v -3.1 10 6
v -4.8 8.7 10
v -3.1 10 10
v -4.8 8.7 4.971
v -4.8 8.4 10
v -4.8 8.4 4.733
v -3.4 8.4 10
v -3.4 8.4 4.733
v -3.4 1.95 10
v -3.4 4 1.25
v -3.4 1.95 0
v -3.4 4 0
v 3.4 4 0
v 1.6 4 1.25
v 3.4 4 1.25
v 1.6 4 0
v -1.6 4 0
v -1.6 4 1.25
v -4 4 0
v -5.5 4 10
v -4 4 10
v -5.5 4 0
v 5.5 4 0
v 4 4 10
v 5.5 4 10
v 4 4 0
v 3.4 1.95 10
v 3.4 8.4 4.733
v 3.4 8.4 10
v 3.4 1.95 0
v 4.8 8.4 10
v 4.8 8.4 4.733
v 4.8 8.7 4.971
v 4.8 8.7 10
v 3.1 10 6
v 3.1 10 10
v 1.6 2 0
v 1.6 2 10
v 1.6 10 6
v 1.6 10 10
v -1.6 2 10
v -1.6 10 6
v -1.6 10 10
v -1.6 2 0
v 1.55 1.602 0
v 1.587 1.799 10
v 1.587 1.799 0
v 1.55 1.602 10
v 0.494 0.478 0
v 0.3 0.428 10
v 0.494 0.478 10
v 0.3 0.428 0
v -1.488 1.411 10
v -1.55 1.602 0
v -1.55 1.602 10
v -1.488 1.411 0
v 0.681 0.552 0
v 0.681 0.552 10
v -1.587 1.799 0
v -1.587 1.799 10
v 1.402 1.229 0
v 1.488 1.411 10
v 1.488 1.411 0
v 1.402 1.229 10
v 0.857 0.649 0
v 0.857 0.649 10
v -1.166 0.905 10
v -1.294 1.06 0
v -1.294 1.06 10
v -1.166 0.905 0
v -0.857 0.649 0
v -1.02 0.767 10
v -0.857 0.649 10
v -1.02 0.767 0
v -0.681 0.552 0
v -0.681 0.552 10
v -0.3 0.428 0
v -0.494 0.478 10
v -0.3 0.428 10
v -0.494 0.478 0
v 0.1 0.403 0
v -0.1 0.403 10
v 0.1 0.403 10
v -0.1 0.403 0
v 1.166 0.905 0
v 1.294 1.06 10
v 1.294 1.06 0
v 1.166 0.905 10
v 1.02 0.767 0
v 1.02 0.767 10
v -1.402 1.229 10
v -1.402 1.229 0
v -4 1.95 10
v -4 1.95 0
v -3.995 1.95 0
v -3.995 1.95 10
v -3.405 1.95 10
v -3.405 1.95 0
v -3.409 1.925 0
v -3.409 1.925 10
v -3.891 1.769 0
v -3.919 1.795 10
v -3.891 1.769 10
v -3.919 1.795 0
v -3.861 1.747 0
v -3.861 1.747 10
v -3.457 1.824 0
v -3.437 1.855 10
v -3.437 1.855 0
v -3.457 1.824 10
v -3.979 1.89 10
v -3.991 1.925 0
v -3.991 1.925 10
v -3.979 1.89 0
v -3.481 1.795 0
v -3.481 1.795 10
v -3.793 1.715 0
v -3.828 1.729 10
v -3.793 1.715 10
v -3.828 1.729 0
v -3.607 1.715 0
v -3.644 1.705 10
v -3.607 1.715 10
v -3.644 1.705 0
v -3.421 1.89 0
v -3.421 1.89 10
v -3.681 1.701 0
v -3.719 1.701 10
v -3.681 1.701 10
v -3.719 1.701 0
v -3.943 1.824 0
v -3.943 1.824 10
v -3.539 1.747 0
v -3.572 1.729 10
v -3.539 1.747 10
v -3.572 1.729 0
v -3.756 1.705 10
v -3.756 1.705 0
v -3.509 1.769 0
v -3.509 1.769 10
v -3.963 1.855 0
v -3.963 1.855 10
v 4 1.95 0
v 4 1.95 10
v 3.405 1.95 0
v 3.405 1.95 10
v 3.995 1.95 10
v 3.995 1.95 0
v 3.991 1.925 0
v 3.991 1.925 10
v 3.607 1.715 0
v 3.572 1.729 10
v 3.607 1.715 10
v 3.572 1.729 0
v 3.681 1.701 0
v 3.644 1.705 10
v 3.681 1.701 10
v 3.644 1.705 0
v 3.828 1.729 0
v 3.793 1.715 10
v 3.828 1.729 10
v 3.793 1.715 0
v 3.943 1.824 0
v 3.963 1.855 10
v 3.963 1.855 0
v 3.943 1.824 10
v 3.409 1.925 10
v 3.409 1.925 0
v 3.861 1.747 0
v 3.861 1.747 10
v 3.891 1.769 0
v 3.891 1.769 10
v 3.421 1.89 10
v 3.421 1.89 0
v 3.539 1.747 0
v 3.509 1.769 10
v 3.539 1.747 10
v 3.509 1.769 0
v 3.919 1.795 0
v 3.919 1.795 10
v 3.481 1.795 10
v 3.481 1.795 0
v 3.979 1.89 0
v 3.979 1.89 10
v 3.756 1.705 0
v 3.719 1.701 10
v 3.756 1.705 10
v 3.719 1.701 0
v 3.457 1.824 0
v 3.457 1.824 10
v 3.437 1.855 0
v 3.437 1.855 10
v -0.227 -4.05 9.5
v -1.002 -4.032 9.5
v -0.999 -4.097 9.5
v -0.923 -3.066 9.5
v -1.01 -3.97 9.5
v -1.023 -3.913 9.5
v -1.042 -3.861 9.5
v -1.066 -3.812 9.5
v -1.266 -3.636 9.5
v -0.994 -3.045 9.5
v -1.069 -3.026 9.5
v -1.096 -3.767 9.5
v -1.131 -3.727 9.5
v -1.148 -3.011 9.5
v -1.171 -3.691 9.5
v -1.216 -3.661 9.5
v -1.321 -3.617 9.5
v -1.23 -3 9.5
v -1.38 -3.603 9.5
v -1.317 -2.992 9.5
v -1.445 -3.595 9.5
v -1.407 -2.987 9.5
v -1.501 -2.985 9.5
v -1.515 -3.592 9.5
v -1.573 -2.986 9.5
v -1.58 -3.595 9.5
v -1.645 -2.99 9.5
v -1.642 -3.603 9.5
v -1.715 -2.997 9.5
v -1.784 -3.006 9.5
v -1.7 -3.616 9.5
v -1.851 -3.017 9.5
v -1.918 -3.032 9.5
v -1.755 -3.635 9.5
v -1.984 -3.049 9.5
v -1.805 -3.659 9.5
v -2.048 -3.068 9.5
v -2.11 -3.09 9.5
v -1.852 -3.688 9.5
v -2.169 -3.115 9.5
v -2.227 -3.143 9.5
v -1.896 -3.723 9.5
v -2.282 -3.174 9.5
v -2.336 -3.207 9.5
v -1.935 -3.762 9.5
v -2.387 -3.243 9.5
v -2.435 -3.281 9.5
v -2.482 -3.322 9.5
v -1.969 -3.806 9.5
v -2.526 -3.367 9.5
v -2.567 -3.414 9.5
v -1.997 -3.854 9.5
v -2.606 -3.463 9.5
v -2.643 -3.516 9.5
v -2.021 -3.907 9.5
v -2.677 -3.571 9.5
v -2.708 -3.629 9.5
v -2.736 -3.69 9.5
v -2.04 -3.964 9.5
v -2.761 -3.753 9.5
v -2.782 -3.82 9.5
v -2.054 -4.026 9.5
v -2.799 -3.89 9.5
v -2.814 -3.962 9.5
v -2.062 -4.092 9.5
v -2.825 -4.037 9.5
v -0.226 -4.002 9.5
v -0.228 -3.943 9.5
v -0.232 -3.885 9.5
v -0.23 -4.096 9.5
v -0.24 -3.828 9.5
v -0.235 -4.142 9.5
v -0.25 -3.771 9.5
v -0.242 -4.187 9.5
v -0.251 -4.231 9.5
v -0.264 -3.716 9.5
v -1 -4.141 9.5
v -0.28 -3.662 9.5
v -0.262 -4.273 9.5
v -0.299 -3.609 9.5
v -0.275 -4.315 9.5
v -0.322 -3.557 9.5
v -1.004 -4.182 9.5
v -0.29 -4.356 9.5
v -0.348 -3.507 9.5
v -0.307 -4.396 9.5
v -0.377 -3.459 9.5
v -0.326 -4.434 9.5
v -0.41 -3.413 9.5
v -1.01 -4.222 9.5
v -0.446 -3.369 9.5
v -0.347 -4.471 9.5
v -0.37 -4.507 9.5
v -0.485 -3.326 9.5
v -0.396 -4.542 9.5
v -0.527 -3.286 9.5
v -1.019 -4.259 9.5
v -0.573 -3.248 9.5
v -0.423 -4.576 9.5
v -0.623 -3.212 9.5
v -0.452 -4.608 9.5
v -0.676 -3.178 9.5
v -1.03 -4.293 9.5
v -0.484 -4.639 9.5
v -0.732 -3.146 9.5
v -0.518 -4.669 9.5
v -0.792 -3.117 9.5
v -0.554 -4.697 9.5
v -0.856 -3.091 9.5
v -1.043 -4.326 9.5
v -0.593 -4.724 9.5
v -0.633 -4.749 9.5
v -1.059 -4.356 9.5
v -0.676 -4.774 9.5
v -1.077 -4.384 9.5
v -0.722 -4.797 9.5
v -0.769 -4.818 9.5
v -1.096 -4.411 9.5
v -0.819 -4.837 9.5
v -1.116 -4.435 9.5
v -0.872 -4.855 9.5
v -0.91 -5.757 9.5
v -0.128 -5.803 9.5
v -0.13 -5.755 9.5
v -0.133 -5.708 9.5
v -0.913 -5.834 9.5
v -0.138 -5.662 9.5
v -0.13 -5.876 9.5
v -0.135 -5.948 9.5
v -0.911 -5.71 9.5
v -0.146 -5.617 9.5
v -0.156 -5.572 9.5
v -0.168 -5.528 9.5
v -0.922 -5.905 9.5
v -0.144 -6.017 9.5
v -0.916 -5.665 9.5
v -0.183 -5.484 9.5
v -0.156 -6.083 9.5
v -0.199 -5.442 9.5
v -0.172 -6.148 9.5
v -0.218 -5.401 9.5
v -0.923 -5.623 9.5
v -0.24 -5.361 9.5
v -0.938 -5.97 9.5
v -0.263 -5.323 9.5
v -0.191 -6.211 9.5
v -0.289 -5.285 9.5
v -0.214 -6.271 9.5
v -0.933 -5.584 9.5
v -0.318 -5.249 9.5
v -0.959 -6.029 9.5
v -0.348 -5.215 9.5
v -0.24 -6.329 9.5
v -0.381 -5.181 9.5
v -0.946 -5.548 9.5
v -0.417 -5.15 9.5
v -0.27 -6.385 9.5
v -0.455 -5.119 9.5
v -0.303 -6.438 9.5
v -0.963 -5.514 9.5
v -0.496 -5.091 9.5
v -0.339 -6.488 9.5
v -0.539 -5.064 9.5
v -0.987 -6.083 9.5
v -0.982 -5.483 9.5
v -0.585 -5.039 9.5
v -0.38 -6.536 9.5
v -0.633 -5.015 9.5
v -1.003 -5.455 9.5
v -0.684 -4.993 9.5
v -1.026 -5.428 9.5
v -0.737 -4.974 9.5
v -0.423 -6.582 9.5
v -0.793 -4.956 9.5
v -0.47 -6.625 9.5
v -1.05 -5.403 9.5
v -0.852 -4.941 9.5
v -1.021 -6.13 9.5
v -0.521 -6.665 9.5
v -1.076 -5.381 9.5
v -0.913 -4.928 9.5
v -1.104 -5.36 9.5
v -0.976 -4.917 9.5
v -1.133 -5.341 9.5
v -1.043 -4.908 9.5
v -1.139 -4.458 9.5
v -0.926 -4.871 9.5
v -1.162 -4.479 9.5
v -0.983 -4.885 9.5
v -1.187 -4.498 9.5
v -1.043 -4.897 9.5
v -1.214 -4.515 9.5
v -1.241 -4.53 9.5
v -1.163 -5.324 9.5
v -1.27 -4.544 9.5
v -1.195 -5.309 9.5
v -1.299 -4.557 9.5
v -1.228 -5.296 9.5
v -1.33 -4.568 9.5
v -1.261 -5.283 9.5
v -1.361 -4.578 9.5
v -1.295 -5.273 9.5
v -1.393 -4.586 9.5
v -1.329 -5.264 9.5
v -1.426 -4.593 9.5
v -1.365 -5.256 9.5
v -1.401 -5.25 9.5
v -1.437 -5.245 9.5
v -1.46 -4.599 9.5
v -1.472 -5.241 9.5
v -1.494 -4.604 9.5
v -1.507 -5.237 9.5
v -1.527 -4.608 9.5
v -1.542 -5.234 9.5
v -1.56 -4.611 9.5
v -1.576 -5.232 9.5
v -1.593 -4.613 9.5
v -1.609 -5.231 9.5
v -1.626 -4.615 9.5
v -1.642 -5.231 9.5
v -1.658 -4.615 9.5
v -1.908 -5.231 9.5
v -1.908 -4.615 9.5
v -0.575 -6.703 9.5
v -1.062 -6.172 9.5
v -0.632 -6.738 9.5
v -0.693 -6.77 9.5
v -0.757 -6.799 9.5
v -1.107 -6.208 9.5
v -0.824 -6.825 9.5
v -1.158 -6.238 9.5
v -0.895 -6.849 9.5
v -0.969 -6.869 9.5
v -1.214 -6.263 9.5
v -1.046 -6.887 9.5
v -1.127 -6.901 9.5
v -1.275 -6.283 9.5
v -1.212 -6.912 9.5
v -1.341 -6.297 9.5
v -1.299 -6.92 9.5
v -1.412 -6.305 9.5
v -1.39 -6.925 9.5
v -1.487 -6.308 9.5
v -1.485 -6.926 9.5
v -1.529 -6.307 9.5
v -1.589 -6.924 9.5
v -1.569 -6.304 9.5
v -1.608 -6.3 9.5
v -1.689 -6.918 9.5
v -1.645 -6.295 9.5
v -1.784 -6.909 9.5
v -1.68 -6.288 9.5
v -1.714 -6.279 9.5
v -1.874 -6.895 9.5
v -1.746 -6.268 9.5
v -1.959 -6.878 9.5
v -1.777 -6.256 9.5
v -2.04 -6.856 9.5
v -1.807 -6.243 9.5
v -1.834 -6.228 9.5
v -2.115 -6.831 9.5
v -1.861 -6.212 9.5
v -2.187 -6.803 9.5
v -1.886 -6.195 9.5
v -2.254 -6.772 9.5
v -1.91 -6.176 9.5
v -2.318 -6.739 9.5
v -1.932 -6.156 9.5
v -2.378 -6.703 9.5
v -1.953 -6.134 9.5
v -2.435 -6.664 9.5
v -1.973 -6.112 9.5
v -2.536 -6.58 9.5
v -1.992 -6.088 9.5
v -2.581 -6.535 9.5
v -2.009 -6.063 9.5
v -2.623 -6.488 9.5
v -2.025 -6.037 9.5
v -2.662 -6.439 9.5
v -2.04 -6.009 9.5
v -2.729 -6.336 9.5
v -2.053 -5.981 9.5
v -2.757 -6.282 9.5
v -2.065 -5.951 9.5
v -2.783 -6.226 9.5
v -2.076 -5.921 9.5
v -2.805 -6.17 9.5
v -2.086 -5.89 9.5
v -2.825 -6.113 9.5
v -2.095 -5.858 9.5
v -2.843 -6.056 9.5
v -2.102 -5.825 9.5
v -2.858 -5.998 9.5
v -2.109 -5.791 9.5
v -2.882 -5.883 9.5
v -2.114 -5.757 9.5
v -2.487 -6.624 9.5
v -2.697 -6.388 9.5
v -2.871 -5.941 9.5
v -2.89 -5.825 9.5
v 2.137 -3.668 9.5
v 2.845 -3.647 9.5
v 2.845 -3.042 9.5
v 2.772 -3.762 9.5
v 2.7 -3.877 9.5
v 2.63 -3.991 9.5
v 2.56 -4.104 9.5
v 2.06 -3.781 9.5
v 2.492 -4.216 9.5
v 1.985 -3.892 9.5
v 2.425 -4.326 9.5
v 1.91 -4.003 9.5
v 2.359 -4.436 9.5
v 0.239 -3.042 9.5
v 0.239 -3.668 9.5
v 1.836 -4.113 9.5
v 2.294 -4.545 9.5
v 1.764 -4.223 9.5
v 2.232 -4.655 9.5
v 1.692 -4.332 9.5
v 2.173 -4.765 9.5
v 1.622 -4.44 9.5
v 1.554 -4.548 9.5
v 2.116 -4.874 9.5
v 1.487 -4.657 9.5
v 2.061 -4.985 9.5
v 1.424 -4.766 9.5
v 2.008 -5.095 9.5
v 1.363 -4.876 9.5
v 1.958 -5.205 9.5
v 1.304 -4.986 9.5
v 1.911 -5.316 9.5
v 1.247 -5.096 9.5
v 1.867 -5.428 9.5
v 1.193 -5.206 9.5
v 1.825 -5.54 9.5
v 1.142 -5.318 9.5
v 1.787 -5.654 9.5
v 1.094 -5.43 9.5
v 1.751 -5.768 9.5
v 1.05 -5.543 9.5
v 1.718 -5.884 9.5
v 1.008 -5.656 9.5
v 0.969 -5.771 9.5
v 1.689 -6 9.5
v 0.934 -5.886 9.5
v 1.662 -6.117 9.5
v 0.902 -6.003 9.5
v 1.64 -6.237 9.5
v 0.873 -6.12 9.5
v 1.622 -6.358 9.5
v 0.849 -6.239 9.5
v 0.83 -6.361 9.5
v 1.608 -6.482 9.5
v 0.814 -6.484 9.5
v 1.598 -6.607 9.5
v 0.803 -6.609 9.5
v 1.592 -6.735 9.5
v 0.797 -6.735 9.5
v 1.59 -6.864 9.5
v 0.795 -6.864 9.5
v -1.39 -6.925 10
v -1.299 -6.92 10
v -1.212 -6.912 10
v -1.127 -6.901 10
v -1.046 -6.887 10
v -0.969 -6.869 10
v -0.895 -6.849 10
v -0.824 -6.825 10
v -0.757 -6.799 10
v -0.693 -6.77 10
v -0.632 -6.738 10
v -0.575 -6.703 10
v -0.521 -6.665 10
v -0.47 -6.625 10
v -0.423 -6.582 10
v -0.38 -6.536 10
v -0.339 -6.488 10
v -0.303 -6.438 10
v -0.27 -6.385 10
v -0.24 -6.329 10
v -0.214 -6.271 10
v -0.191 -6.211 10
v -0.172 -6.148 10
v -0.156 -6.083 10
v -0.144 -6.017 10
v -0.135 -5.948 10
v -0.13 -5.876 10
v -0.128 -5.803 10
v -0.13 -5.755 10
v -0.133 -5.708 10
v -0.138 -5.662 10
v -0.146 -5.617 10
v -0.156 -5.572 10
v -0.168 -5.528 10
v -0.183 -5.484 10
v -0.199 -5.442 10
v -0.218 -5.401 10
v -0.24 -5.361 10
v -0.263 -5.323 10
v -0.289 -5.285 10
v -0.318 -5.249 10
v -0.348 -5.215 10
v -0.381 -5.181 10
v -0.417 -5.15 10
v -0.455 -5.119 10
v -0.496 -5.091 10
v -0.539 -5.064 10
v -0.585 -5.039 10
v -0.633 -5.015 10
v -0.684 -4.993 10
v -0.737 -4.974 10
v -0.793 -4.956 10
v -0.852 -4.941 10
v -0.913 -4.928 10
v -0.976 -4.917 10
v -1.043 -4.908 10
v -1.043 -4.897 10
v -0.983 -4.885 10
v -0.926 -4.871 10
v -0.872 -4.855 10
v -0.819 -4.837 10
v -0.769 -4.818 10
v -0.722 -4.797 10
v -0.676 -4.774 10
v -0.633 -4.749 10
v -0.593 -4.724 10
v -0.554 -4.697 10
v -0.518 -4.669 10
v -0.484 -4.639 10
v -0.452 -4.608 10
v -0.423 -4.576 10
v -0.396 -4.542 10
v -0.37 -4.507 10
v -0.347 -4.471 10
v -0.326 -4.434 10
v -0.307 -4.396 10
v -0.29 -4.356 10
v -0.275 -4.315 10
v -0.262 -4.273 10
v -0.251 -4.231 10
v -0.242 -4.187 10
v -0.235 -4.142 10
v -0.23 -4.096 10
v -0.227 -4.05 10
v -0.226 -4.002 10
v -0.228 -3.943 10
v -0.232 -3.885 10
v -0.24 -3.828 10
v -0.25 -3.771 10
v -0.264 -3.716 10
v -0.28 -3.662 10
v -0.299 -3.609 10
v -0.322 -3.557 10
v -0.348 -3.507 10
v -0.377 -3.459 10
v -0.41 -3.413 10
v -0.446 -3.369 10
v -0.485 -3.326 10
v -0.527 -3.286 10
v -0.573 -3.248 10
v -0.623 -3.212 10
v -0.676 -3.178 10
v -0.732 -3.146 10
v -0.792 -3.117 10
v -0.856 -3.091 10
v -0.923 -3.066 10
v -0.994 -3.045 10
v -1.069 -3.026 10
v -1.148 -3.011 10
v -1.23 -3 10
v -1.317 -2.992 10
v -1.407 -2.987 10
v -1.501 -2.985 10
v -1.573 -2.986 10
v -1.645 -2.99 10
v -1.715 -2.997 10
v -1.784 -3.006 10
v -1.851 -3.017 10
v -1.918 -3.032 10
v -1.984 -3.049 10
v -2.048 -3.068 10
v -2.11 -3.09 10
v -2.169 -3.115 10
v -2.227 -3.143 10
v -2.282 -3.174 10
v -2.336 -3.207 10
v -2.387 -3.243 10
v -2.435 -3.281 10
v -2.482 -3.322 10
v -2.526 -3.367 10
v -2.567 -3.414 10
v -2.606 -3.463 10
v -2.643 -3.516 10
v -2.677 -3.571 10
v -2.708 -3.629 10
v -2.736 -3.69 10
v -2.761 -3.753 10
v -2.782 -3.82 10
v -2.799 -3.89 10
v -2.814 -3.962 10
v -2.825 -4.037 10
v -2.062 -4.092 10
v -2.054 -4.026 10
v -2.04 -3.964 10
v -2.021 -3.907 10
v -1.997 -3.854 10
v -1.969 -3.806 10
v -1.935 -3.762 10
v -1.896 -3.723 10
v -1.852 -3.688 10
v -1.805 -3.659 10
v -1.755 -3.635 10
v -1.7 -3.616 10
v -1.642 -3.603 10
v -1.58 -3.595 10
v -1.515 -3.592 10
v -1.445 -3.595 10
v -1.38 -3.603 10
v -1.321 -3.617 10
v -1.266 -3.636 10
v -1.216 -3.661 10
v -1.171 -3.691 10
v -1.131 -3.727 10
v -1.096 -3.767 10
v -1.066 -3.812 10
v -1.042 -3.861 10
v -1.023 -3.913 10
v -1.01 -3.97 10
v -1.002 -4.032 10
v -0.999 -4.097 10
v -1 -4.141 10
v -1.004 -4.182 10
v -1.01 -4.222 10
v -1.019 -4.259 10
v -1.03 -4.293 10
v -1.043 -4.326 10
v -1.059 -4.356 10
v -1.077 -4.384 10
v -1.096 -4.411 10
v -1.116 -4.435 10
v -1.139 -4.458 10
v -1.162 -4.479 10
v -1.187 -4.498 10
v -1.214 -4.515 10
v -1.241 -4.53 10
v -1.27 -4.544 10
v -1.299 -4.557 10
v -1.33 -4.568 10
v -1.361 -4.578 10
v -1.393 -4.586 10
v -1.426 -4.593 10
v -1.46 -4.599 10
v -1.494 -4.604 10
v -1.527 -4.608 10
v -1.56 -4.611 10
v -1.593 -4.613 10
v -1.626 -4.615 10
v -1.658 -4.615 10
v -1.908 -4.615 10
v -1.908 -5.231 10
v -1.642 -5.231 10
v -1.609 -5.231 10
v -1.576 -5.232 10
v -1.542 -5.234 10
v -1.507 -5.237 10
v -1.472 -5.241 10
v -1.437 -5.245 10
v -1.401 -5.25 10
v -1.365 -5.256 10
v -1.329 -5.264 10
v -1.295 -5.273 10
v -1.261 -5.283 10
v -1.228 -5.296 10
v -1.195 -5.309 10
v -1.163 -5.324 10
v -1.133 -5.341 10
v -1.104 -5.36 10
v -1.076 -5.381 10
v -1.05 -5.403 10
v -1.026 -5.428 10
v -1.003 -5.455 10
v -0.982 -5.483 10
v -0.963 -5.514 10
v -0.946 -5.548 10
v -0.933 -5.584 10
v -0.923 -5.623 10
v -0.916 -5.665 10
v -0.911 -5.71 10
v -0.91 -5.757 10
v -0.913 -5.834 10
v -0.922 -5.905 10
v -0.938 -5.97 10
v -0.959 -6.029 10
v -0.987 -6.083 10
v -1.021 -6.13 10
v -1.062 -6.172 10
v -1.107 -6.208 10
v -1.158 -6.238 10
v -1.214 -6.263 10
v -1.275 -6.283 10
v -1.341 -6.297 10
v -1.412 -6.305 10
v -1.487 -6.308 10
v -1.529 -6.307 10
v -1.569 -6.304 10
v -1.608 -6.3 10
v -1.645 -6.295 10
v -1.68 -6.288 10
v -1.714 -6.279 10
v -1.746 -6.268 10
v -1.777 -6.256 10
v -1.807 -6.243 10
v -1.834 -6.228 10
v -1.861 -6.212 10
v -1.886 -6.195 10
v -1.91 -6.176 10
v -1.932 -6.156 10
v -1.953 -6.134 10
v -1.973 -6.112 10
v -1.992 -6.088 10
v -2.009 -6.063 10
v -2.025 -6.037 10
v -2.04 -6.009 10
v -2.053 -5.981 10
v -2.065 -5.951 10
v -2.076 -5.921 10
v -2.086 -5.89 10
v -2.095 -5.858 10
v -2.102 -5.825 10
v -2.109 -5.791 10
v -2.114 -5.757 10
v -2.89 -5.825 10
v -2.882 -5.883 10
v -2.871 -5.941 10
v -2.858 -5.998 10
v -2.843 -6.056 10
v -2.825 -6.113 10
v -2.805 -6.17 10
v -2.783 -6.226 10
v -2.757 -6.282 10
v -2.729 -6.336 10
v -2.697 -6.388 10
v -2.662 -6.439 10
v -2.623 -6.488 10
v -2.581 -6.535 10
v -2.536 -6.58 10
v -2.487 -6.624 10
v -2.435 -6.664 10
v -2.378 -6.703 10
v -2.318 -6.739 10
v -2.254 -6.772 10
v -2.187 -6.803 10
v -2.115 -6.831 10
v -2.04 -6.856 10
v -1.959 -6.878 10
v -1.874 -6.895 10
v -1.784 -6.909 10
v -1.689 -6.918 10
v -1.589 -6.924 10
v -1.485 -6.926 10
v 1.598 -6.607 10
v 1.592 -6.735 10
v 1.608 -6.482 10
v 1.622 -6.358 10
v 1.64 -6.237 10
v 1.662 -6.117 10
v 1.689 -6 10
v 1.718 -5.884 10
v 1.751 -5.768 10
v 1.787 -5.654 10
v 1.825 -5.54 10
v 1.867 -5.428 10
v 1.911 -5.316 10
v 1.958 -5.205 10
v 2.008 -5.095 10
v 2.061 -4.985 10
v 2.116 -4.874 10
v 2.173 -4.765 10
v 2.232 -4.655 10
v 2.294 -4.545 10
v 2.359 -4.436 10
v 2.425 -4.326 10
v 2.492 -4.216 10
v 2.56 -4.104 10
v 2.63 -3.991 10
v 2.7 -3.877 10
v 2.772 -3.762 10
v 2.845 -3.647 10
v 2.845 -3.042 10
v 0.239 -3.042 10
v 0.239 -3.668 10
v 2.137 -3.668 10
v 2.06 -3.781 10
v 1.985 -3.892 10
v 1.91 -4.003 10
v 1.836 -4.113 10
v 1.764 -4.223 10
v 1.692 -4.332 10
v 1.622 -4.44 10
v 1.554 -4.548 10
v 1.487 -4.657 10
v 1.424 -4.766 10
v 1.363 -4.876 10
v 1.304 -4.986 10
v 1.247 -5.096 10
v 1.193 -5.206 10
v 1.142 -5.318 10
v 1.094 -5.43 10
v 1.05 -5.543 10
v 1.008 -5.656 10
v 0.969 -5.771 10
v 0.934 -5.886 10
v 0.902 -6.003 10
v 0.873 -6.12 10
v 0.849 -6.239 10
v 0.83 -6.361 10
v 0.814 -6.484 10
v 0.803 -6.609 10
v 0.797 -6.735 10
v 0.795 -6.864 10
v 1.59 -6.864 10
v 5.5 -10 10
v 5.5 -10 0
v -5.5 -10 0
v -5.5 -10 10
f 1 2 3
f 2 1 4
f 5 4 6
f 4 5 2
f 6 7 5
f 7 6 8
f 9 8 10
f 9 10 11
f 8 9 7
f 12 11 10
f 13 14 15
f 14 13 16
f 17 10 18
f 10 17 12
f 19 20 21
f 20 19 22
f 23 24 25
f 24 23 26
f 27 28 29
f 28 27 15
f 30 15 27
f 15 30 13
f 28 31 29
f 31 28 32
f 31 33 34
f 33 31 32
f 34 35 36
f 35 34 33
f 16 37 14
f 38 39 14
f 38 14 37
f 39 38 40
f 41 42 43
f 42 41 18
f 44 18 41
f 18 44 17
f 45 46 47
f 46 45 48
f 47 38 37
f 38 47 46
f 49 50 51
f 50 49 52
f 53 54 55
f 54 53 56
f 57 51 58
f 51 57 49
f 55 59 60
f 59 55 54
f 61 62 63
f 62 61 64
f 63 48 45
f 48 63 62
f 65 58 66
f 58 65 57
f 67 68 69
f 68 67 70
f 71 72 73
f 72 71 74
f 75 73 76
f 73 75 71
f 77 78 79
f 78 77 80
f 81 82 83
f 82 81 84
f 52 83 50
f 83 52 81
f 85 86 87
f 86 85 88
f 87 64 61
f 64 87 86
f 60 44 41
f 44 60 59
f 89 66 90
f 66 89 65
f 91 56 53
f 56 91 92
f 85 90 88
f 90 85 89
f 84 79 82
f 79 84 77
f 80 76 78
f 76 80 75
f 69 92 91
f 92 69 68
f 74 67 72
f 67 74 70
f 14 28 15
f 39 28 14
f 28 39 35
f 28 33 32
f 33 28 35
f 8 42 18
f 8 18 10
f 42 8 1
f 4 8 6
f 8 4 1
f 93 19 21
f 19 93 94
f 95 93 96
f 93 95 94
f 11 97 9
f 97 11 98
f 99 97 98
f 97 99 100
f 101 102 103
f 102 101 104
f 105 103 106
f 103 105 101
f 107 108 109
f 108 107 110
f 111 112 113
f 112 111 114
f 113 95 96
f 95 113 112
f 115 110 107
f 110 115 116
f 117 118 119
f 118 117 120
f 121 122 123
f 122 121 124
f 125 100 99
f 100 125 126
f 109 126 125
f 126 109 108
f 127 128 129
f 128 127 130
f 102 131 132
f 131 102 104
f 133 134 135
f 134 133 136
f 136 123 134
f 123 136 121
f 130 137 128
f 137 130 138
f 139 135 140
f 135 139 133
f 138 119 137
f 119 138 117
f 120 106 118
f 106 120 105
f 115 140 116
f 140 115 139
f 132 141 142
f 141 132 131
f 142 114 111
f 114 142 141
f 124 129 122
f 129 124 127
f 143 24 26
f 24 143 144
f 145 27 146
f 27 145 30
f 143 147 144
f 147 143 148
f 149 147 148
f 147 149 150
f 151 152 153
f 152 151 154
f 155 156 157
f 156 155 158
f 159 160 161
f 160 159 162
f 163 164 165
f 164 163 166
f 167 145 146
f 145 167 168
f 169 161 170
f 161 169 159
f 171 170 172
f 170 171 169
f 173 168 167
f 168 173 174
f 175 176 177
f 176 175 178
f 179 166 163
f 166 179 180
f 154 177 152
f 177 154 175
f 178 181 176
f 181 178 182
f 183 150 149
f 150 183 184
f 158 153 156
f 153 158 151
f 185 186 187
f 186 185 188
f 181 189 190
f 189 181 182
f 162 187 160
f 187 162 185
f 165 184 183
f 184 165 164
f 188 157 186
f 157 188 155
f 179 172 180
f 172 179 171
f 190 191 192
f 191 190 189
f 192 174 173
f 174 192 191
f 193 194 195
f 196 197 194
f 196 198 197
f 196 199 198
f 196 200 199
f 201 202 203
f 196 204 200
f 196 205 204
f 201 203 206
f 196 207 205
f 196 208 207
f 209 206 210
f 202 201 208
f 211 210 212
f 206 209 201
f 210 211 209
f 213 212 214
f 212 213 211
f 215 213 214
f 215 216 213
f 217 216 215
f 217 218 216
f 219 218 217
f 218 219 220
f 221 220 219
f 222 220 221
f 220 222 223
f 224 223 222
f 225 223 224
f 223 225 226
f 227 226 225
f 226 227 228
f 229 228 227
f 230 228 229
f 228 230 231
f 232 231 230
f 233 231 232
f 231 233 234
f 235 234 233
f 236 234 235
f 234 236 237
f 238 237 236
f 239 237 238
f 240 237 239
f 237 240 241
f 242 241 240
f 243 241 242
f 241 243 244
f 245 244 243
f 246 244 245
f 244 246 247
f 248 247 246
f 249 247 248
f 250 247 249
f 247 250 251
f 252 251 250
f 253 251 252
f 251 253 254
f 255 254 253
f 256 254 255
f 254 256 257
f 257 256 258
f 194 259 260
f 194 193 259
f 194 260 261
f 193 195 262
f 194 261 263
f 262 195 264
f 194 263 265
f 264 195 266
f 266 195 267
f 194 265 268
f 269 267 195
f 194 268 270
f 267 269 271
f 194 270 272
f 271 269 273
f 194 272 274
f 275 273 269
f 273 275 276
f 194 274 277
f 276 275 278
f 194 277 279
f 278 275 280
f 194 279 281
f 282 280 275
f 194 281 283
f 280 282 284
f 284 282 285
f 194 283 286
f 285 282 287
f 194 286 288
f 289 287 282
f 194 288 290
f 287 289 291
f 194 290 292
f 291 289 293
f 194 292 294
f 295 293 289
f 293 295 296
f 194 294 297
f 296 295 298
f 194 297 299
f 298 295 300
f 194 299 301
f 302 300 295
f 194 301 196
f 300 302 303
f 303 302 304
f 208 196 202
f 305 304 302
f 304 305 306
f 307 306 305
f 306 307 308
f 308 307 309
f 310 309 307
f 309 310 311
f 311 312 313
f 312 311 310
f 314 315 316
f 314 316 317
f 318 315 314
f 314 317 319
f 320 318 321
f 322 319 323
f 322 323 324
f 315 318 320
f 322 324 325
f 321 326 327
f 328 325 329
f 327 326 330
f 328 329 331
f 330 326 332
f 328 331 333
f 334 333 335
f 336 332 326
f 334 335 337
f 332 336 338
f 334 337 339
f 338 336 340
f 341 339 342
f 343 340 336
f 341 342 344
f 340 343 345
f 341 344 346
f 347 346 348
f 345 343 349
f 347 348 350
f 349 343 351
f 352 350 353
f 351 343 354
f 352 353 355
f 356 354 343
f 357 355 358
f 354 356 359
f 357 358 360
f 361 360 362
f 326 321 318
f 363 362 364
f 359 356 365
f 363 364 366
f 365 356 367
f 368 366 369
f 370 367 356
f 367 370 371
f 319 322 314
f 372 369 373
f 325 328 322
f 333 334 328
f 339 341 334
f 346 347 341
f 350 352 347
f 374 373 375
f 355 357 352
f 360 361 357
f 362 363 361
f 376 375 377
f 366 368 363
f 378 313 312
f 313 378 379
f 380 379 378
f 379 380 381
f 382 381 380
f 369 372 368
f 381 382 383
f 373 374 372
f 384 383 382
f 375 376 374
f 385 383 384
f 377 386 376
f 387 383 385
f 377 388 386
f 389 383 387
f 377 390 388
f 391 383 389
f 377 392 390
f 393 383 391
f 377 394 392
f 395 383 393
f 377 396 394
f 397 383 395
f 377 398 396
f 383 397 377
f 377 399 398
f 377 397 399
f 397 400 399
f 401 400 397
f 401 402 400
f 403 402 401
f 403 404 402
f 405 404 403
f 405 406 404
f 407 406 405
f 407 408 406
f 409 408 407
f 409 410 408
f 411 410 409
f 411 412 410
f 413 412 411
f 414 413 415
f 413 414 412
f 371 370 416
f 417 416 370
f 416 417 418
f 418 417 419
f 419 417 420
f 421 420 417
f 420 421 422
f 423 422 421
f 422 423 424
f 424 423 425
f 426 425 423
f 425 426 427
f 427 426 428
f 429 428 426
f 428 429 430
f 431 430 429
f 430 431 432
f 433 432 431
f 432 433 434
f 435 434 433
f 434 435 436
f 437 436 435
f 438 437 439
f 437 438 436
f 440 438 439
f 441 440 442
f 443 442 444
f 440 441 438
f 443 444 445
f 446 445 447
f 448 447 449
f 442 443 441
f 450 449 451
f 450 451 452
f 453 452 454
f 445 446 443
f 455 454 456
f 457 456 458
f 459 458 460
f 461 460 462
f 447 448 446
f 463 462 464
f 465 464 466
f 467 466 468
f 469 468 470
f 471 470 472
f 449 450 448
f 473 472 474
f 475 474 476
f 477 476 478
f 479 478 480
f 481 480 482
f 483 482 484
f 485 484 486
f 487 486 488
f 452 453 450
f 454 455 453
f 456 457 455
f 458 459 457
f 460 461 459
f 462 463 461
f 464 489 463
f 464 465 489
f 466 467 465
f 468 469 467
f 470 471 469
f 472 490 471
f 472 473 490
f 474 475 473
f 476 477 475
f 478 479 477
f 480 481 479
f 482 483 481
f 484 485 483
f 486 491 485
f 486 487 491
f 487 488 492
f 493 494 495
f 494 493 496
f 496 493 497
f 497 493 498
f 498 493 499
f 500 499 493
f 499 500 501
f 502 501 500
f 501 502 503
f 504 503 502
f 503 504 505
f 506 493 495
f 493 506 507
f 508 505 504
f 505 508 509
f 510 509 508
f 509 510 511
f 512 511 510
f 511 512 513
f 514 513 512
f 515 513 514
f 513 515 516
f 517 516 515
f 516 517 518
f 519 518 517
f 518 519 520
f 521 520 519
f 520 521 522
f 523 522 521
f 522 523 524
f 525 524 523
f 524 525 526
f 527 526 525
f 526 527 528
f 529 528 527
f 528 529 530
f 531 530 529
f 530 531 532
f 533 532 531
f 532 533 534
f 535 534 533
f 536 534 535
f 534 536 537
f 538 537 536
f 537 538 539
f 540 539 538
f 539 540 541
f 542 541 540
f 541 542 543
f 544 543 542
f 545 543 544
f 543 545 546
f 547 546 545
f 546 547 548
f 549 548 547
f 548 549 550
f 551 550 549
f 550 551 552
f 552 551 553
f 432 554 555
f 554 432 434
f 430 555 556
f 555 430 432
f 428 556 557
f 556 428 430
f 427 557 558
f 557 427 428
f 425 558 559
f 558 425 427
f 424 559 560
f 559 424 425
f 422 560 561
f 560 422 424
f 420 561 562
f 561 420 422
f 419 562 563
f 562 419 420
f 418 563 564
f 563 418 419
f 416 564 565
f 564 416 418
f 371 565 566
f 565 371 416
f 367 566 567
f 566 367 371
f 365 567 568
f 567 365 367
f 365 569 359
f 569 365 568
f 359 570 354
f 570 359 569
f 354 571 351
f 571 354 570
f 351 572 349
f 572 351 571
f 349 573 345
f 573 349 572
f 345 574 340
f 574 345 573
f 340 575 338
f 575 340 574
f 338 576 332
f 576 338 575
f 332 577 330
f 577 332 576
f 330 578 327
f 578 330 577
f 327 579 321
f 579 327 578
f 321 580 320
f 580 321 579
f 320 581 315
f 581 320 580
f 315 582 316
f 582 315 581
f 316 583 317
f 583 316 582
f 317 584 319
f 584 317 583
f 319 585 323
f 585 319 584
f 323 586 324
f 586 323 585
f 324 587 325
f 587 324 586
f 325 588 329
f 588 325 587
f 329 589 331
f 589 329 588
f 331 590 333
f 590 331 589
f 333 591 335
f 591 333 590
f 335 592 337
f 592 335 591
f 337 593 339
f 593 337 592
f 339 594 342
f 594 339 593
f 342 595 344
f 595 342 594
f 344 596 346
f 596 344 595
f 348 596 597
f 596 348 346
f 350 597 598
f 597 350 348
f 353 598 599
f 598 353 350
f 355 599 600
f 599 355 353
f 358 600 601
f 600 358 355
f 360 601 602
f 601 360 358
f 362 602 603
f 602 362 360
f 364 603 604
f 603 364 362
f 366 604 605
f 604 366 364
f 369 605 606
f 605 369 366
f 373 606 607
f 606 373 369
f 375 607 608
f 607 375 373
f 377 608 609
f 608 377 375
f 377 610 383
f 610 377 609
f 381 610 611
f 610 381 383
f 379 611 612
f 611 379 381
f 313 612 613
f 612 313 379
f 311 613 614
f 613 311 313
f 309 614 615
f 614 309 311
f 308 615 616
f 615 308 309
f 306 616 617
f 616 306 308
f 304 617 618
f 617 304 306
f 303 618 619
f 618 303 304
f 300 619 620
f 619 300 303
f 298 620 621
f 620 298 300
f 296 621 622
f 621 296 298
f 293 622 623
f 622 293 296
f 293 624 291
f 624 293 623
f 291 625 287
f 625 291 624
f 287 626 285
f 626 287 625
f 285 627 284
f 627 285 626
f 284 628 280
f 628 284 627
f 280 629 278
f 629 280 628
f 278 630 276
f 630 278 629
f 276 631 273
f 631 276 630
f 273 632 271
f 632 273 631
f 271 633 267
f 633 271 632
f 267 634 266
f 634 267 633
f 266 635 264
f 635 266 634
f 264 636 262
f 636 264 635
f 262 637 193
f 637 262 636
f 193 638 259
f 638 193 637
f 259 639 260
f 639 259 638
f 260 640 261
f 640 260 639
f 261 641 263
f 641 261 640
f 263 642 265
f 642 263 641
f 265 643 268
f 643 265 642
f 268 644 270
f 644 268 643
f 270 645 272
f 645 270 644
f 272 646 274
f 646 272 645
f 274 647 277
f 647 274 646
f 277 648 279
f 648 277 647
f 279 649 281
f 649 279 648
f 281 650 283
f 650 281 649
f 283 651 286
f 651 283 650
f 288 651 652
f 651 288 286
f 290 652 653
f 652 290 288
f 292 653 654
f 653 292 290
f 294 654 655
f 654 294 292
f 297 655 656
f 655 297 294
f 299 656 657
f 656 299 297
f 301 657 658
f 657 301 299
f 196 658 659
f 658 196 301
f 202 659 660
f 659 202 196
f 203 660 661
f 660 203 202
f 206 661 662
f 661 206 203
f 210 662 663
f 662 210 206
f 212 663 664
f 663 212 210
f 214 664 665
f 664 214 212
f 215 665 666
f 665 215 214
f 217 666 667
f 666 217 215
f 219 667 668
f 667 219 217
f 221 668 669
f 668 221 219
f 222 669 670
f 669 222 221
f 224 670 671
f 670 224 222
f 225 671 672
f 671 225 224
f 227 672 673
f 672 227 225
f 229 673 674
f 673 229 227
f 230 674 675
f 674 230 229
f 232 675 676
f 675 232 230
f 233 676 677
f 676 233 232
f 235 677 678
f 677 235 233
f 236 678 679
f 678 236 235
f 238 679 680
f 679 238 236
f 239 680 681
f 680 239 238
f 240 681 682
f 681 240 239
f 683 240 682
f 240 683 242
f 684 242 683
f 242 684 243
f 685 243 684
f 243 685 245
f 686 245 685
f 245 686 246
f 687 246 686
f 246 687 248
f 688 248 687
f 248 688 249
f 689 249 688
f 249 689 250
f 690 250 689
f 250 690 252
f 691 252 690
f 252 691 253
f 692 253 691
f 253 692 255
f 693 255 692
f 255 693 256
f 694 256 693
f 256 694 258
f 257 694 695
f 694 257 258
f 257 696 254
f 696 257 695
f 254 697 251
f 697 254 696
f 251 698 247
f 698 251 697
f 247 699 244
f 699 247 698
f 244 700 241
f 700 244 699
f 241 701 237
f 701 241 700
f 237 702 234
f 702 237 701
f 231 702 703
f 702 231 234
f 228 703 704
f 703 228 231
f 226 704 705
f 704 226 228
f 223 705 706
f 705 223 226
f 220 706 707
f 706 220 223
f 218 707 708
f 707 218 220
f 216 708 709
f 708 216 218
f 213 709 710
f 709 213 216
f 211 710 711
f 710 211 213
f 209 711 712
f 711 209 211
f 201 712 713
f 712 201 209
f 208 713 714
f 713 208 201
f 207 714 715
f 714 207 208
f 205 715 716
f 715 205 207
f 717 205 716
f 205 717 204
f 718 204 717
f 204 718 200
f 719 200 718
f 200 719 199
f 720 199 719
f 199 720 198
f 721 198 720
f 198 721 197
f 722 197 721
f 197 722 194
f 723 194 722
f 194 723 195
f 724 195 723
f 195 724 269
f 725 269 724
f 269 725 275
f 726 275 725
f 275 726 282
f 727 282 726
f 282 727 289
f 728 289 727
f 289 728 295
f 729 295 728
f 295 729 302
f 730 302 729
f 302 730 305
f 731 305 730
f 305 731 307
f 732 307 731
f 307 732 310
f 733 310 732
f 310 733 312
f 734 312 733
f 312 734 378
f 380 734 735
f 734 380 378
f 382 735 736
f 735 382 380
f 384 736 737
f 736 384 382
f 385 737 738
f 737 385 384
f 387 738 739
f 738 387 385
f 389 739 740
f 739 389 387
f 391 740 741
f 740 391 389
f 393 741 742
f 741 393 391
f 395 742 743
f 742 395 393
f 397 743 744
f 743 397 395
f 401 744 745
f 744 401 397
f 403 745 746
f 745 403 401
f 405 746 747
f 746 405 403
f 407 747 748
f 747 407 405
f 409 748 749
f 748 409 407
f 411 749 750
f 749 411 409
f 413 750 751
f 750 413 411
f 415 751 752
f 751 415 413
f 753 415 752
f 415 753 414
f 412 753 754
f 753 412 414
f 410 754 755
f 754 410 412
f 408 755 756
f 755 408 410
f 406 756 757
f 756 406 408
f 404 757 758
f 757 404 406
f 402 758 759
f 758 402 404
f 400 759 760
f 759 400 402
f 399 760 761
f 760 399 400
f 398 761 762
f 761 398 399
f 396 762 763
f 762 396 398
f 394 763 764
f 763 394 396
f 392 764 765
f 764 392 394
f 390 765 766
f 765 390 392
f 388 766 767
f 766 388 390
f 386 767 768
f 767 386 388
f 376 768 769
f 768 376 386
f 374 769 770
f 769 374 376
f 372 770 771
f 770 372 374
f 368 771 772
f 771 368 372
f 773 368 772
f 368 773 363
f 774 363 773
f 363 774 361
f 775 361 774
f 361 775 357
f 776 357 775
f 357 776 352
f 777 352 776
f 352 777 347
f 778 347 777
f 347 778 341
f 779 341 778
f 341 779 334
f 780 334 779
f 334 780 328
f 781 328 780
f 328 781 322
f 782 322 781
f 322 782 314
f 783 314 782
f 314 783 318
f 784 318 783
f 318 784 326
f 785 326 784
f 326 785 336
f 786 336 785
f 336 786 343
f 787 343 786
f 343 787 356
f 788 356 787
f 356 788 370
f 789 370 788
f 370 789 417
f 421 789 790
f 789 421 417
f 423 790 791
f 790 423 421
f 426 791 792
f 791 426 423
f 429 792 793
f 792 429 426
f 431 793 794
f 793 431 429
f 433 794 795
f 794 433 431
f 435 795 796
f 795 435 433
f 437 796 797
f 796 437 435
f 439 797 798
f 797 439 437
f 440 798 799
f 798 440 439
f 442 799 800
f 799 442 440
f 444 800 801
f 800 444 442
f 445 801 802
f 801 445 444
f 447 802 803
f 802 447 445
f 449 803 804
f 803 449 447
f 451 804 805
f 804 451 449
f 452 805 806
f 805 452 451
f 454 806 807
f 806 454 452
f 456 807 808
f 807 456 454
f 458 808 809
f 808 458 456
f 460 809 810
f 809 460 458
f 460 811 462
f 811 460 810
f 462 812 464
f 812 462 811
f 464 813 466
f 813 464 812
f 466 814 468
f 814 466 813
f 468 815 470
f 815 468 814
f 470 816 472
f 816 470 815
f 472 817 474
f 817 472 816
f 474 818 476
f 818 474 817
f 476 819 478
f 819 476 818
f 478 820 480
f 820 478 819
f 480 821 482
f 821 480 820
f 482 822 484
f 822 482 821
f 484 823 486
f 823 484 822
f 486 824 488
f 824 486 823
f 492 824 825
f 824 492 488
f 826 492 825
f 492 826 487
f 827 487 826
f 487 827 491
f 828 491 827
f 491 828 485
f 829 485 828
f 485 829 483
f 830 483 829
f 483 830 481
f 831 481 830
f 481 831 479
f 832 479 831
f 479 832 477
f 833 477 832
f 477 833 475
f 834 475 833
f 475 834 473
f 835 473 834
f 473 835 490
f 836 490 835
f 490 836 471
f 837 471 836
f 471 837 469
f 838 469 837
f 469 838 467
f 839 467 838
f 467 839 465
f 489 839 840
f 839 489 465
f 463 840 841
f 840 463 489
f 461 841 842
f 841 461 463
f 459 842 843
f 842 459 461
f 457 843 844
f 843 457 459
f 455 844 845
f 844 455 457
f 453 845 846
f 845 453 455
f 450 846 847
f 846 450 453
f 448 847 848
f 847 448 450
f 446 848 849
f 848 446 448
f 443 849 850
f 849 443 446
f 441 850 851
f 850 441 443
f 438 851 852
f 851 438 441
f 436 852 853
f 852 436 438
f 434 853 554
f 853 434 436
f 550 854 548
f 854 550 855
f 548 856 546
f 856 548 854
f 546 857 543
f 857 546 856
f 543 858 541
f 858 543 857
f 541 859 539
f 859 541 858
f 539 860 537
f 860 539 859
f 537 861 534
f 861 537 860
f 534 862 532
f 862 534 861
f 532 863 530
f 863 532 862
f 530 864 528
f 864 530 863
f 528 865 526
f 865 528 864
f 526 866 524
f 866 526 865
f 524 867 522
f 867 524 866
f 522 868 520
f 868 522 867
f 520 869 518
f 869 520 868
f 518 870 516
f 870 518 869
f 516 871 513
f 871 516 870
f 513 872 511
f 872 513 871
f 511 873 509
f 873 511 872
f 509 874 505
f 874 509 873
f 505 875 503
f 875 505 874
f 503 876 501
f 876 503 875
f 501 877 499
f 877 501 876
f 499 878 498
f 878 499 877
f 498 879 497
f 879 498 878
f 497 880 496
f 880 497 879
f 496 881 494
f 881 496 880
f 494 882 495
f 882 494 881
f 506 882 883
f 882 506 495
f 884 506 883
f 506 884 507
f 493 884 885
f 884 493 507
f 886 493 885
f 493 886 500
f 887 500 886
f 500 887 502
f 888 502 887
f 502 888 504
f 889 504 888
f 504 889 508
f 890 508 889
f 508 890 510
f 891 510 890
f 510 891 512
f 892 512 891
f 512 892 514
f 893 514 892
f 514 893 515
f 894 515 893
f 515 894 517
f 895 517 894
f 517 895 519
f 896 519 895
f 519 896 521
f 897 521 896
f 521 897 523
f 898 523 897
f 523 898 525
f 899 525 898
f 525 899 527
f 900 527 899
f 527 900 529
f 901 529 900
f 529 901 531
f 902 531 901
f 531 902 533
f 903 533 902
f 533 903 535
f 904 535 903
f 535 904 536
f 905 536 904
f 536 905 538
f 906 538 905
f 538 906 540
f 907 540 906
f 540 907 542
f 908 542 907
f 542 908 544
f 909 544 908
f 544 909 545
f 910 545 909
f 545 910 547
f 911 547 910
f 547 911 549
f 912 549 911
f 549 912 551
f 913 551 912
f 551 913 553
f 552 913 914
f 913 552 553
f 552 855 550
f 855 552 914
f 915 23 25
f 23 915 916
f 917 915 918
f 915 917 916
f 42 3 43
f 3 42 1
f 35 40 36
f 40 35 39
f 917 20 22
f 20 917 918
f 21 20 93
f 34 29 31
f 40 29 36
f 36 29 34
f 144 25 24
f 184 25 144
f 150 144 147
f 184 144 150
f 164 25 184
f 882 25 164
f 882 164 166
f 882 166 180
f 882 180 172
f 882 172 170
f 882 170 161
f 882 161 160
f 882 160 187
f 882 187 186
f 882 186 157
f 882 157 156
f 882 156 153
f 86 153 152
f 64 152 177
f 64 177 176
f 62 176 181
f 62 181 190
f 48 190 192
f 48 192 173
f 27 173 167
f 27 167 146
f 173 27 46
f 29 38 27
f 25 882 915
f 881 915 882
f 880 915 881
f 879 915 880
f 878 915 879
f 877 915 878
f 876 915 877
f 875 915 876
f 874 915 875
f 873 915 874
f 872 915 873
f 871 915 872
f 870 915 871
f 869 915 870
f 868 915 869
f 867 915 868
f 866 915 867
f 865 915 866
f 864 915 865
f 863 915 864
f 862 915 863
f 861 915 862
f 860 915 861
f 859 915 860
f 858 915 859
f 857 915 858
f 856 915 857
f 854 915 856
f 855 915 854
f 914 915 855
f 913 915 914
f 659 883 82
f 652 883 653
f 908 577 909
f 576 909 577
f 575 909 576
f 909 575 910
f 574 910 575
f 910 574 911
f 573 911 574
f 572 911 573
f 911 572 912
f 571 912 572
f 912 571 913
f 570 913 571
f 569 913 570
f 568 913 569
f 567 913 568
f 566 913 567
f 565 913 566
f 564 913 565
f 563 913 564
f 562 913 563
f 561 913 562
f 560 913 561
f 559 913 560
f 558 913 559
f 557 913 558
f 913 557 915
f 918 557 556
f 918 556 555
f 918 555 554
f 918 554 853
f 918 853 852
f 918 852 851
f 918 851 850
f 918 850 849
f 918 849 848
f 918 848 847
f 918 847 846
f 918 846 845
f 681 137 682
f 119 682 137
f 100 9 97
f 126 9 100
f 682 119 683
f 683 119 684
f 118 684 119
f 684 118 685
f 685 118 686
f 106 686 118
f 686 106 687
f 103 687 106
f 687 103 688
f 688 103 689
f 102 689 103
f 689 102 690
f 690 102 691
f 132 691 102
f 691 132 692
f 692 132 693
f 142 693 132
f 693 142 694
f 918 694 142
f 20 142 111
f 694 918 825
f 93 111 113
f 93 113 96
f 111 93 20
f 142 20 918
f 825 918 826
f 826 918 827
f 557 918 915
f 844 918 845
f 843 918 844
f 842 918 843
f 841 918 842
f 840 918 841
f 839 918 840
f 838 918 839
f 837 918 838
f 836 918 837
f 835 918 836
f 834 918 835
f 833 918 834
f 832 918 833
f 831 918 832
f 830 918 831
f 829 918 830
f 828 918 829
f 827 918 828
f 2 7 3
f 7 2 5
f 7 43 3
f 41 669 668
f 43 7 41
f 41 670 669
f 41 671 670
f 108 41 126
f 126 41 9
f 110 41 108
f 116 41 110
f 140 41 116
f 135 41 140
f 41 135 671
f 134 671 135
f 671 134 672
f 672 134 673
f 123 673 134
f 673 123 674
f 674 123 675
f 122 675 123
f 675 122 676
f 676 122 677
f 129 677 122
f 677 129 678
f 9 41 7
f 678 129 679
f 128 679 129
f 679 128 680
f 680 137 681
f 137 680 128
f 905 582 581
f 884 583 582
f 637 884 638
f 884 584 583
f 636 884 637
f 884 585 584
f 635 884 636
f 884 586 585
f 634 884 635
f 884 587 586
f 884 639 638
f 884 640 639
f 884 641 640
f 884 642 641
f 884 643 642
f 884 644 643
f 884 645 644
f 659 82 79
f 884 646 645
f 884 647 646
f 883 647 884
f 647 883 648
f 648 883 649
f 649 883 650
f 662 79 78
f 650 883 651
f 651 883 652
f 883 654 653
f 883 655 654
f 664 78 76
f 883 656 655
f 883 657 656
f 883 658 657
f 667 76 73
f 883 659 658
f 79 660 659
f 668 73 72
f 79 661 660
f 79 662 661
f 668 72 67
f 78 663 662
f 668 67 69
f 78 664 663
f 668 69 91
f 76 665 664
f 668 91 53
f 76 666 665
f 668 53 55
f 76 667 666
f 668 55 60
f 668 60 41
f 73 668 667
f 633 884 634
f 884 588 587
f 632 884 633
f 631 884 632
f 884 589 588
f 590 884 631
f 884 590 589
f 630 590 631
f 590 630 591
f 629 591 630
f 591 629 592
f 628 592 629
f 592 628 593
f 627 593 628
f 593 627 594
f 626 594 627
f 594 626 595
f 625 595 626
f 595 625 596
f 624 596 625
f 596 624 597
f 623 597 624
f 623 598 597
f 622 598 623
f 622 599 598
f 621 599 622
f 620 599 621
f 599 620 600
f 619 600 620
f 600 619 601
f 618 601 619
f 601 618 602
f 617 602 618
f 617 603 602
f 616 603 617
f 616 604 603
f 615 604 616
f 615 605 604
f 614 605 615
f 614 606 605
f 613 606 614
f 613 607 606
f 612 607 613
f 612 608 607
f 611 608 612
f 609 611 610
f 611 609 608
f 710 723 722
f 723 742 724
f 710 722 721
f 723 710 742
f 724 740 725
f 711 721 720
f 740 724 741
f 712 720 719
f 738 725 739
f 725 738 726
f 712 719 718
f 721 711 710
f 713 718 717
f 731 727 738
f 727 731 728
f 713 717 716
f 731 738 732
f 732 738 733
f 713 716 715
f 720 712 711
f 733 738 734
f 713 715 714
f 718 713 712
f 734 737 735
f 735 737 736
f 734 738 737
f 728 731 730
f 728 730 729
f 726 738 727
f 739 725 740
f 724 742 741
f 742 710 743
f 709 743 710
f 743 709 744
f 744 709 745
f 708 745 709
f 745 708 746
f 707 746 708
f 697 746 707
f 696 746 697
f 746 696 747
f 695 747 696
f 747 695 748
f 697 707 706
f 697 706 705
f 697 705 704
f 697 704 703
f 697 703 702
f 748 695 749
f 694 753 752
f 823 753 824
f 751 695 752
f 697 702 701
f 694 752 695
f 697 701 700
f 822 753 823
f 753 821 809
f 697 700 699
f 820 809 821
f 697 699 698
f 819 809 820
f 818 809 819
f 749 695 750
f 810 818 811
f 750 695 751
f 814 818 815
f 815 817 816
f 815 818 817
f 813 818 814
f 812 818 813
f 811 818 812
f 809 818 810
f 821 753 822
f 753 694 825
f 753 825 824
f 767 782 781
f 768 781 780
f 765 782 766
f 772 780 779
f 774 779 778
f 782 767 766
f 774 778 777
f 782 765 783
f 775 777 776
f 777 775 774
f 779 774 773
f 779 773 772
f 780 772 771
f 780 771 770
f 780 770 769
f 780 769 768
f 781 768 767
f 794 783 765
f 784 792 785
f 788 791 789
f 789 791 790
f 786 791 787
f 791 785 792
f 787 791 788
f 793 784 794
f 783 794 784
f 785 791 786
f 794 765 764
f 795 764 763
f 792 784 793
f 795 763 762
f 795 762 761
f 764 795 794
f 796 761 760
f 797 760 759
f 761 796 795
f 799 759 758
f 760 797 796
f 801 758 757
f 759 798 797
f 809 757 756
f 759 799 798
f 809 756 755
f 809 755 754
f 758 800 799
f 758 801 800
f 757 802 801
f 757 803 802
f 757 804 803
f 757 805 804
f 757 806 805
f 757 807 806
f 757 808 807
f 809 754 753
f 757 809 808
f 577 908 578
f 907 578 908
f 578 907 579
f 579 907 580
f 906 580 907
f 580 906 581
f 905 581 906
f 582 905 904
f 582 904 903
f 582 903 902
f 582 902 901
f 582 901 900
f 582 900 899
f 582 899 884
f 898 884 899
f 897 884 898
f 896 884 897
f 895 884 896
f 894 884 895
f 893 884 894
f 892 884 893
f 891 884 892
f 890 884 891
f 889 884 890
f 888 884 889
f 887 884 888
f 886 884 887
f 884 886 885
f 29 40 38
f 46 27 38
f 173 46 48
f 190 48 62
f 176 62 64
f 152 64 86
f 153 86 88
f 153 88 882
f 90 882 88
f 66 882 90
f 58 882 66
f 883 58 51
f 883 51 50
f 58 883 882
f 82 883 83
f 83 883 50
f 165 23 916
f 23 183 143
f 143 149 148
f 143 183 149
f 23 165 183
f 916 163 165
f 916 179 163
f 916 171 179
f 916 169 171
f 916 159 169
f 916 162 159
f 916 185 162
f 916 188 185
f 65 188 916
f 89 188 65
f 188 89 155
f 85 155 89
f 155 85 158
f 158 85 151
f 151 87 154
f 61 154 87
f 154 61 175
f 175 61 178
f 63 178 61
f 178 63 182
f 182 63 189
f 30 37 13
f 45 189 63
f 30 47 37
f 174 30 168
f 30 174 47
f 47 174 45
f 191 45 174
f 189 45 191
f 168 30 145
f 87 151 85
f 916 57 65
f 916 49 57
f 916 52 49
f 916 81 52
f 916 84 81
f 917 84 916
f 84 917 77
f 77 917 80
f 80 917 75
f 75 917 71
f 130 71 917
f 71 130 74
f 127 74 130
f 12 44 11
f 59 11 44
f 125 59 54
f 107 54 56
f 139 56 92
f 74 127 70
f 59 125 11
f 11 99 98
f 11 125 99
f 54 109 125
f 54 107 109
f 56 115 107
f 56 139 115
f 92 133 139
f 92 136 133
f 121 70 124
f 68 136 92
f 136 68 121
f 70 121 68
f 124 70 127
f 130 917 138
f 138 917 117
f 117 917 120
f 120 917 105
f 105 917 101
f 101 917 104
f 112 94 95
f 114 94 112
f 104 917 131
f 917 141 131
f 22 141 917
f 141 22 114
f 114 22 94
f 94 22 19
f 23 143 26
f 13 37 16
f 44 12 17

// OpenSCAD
$fn = 50;

difference() {
	union() {
		translate(v = [0, 4.0, 0]) {
			rotate(a = [90, 0, 0]) {
				difference() {
					union() {
						translate(v = [-5.5, 0, -6.0]) {
							cube(size = [11.0, 10.0, 20.0]);
						}
					}
					union() {
						translate(v = [0, 0, 0]) {
							rotate(a = [0, 0, 0]) {
								difference() {
									union() {
										translate(v = [0, 10.1, 0]) {
											rotate(a = [90, 0, 0]) {
												linear_extrude(height = 10.2) {
													polygon(points = [[-3.1, -6.1], [-3.1, -6.0], [-4.8, -4.7], [-4.8, -4.4], [-3.4, -4.4], [-3.4, 0], [-5.6, 0], [-5.6, -6.1]]);
												}
											}
										}
										translate(v = [0, 10.1, 0]) {
											rotate(a = [90, 0, 0]) {
												linear_extrude(height = 10.2) {
													polygon(points = [[3.1, -6.1], [3.1, -6.0], [4.8, -4.7], [4.8, -4.4], [3.4, -4.4], [3.4, 0], [5.6, 0], [5.6, -6.1]]);
												}
											}
										}
										translate(v = [-1.5999999999999999, -0.1, -6.1]) {
											cube(size = [3.1999999999999997, 10.2, 8.1]);
										}
										translate(v = [0, 10.1, 2.0]) {
											rotate(a = [90, 0, 0]) {
												cylinder(h = 10.2, r = 1.5999999999999999);
											}
										}
									}
									union();
								}
							}
						}
						translate(v = [0, 0, 212.0]) {
							rotate(a = [0, 180, 0]) {
								difference() {
									union() {
										translate(v = [0, 10.1, 0]) {
											rotate(a = [90, 0, 0]) {
												linear_extrude(height = 10.2) {
													polygon(points = [[-3.1, -6.1], [-3.1, -6.0], [-4.8, -4.7], [-4.8, -4.4], [-3.4, -4.4], [-3.4, 0], [-5.6, 0], [-5.6, -6.1]]);
												}
											}
										}
										translate(v = [0, 10.1, 0]) {
											rotate(a = [90, 0, 0]) {
												linear_extrude(height = 10.2) {
													polygon(points = [[3.1, -6.1], [3.1, -6.0], [4.8, -4.7], [4.8, -4.4], [3.4, -4.4], [3.4, 0], [5.6, 0], [5.6, -6.1]]);
												}
											}
										}
										translate(v = [-1.5999999999999999, -0.1, -6.1]) {
											cube(size = [3.1999999999999997, 10.2, 8.1]);
										}
										translate(v = [0, 10.1, 2.0]) {
											rotate(a = [90, 0, 0]) {
												cylinder(h = 10.2, r = 1.5999999999999999);
											}
										}
									}
									union();
								}
							}
						}
						translate(v = [-5.6, 0, 0]) {
							rotate(a = [90, 0, 90]) {
								linear_extrude(height = 11.2) {
									polygon(points = [[-0.1, -6.1], [6.079166666666667, -6.1], [1.25, 0], [-0.1, 0]]);
								}
							}
						}
						translate(v = [0, 10.1, 0]) {
							rotate(a = [90, 0, 0]) {
								linear_extrude(height = 10.2) {
									polygon(points = [[-3.4, -0.1], [-4.0, -0.1], [-4.0, 2.05], [-3.4, 2.05]]);
								}
							}
						}
						translate(v = [-3.6999999999999997, 10.1, 2.0]) {
							rotate(a = [90, 0, 0]) {
								cylinder(h = 10.2, r = 0.3);
							}
						}
						translate(v = [0, 10.1, 0]) {
							rotate(a = [90, 0, 0]) {
								linear_extrude(height = 10.2) {
									polygon(points = [[3.4, -0.1], [4.0, -0.1], [4.0, 2.05], [3.4, 2.05]]);
								}
							}
						}
						translate(v = [3.6999999999999997, 10.1, 2.0]) {
							rotate(a = [90, 0, 0]) {
								cylinder(h = 10.2, r = 0.3);
							}
						}
						translate(v = [-5.6, 0, 0]) {
							rotate(a = [90, 0, 90]) {
								linear_extrude(height = 11.2) {
									polygon(points = [[-0.1, 218.1], [6.079166666666667, 218.1], [1.25, 212.0], [-0.1, 212.0]]);
								}
							}
						}
						translate(v = [0, 10.1, 0]) {
							rotate(a = [90, 0, 0]) {
								linear_extrude(height = 10.2) {
									polygon(points = [[-3.4, 212.1], [-4.0, 212.1], [-4.0, 209.95], [-3.4, 209.95]]);
								}
							}
						}
						translate(v = [-3.6999999999999997, 10.1, 210.0]) {
							rotate(a = [90, 0, 0]) {
								cylinder(h = 10.2, r = 0.3);
							}
						}
						translate(v = [0, 10.1, 0]) {
							rotate(a = [90, 0, 0]) {
								linear_extrude(height = 10.2) {
									polygon(points = [[3.4, 212.1], [4.0, 212.1], [4.0, 209.95], [3.4, 209.95]]);
								}
							}
						}
						translate(v = [3.6999999999999997, 10.1, 210.0]) {
							rotate(a = [90, 0, 0]) {
								cylinder(h = 10.2, r = 0.3);
							}
						}
						translate(v = [-5.6, 0, 0]) {
							rotate(a = [90, 0, 90]) {
								linear_extrude(height = 11.2) {
									polygon(points = [[10.1, 14.5], [10.1, 197.5], [4.0, 190.3], [4.0, 21.7]]);
								}
							}
						}
						translate(v = [0, 9.5, 9.0]) {
							rotate(a = [-90, 0, 0]) {
								linear_extrude(height = 0.6) {
									text(font = "Arial:style=Bold", halign = "center", size = 4.0, text = "37", valign = "center");
								}
							}
						}
					}
				}
			}
		}
	}
	union();
}
